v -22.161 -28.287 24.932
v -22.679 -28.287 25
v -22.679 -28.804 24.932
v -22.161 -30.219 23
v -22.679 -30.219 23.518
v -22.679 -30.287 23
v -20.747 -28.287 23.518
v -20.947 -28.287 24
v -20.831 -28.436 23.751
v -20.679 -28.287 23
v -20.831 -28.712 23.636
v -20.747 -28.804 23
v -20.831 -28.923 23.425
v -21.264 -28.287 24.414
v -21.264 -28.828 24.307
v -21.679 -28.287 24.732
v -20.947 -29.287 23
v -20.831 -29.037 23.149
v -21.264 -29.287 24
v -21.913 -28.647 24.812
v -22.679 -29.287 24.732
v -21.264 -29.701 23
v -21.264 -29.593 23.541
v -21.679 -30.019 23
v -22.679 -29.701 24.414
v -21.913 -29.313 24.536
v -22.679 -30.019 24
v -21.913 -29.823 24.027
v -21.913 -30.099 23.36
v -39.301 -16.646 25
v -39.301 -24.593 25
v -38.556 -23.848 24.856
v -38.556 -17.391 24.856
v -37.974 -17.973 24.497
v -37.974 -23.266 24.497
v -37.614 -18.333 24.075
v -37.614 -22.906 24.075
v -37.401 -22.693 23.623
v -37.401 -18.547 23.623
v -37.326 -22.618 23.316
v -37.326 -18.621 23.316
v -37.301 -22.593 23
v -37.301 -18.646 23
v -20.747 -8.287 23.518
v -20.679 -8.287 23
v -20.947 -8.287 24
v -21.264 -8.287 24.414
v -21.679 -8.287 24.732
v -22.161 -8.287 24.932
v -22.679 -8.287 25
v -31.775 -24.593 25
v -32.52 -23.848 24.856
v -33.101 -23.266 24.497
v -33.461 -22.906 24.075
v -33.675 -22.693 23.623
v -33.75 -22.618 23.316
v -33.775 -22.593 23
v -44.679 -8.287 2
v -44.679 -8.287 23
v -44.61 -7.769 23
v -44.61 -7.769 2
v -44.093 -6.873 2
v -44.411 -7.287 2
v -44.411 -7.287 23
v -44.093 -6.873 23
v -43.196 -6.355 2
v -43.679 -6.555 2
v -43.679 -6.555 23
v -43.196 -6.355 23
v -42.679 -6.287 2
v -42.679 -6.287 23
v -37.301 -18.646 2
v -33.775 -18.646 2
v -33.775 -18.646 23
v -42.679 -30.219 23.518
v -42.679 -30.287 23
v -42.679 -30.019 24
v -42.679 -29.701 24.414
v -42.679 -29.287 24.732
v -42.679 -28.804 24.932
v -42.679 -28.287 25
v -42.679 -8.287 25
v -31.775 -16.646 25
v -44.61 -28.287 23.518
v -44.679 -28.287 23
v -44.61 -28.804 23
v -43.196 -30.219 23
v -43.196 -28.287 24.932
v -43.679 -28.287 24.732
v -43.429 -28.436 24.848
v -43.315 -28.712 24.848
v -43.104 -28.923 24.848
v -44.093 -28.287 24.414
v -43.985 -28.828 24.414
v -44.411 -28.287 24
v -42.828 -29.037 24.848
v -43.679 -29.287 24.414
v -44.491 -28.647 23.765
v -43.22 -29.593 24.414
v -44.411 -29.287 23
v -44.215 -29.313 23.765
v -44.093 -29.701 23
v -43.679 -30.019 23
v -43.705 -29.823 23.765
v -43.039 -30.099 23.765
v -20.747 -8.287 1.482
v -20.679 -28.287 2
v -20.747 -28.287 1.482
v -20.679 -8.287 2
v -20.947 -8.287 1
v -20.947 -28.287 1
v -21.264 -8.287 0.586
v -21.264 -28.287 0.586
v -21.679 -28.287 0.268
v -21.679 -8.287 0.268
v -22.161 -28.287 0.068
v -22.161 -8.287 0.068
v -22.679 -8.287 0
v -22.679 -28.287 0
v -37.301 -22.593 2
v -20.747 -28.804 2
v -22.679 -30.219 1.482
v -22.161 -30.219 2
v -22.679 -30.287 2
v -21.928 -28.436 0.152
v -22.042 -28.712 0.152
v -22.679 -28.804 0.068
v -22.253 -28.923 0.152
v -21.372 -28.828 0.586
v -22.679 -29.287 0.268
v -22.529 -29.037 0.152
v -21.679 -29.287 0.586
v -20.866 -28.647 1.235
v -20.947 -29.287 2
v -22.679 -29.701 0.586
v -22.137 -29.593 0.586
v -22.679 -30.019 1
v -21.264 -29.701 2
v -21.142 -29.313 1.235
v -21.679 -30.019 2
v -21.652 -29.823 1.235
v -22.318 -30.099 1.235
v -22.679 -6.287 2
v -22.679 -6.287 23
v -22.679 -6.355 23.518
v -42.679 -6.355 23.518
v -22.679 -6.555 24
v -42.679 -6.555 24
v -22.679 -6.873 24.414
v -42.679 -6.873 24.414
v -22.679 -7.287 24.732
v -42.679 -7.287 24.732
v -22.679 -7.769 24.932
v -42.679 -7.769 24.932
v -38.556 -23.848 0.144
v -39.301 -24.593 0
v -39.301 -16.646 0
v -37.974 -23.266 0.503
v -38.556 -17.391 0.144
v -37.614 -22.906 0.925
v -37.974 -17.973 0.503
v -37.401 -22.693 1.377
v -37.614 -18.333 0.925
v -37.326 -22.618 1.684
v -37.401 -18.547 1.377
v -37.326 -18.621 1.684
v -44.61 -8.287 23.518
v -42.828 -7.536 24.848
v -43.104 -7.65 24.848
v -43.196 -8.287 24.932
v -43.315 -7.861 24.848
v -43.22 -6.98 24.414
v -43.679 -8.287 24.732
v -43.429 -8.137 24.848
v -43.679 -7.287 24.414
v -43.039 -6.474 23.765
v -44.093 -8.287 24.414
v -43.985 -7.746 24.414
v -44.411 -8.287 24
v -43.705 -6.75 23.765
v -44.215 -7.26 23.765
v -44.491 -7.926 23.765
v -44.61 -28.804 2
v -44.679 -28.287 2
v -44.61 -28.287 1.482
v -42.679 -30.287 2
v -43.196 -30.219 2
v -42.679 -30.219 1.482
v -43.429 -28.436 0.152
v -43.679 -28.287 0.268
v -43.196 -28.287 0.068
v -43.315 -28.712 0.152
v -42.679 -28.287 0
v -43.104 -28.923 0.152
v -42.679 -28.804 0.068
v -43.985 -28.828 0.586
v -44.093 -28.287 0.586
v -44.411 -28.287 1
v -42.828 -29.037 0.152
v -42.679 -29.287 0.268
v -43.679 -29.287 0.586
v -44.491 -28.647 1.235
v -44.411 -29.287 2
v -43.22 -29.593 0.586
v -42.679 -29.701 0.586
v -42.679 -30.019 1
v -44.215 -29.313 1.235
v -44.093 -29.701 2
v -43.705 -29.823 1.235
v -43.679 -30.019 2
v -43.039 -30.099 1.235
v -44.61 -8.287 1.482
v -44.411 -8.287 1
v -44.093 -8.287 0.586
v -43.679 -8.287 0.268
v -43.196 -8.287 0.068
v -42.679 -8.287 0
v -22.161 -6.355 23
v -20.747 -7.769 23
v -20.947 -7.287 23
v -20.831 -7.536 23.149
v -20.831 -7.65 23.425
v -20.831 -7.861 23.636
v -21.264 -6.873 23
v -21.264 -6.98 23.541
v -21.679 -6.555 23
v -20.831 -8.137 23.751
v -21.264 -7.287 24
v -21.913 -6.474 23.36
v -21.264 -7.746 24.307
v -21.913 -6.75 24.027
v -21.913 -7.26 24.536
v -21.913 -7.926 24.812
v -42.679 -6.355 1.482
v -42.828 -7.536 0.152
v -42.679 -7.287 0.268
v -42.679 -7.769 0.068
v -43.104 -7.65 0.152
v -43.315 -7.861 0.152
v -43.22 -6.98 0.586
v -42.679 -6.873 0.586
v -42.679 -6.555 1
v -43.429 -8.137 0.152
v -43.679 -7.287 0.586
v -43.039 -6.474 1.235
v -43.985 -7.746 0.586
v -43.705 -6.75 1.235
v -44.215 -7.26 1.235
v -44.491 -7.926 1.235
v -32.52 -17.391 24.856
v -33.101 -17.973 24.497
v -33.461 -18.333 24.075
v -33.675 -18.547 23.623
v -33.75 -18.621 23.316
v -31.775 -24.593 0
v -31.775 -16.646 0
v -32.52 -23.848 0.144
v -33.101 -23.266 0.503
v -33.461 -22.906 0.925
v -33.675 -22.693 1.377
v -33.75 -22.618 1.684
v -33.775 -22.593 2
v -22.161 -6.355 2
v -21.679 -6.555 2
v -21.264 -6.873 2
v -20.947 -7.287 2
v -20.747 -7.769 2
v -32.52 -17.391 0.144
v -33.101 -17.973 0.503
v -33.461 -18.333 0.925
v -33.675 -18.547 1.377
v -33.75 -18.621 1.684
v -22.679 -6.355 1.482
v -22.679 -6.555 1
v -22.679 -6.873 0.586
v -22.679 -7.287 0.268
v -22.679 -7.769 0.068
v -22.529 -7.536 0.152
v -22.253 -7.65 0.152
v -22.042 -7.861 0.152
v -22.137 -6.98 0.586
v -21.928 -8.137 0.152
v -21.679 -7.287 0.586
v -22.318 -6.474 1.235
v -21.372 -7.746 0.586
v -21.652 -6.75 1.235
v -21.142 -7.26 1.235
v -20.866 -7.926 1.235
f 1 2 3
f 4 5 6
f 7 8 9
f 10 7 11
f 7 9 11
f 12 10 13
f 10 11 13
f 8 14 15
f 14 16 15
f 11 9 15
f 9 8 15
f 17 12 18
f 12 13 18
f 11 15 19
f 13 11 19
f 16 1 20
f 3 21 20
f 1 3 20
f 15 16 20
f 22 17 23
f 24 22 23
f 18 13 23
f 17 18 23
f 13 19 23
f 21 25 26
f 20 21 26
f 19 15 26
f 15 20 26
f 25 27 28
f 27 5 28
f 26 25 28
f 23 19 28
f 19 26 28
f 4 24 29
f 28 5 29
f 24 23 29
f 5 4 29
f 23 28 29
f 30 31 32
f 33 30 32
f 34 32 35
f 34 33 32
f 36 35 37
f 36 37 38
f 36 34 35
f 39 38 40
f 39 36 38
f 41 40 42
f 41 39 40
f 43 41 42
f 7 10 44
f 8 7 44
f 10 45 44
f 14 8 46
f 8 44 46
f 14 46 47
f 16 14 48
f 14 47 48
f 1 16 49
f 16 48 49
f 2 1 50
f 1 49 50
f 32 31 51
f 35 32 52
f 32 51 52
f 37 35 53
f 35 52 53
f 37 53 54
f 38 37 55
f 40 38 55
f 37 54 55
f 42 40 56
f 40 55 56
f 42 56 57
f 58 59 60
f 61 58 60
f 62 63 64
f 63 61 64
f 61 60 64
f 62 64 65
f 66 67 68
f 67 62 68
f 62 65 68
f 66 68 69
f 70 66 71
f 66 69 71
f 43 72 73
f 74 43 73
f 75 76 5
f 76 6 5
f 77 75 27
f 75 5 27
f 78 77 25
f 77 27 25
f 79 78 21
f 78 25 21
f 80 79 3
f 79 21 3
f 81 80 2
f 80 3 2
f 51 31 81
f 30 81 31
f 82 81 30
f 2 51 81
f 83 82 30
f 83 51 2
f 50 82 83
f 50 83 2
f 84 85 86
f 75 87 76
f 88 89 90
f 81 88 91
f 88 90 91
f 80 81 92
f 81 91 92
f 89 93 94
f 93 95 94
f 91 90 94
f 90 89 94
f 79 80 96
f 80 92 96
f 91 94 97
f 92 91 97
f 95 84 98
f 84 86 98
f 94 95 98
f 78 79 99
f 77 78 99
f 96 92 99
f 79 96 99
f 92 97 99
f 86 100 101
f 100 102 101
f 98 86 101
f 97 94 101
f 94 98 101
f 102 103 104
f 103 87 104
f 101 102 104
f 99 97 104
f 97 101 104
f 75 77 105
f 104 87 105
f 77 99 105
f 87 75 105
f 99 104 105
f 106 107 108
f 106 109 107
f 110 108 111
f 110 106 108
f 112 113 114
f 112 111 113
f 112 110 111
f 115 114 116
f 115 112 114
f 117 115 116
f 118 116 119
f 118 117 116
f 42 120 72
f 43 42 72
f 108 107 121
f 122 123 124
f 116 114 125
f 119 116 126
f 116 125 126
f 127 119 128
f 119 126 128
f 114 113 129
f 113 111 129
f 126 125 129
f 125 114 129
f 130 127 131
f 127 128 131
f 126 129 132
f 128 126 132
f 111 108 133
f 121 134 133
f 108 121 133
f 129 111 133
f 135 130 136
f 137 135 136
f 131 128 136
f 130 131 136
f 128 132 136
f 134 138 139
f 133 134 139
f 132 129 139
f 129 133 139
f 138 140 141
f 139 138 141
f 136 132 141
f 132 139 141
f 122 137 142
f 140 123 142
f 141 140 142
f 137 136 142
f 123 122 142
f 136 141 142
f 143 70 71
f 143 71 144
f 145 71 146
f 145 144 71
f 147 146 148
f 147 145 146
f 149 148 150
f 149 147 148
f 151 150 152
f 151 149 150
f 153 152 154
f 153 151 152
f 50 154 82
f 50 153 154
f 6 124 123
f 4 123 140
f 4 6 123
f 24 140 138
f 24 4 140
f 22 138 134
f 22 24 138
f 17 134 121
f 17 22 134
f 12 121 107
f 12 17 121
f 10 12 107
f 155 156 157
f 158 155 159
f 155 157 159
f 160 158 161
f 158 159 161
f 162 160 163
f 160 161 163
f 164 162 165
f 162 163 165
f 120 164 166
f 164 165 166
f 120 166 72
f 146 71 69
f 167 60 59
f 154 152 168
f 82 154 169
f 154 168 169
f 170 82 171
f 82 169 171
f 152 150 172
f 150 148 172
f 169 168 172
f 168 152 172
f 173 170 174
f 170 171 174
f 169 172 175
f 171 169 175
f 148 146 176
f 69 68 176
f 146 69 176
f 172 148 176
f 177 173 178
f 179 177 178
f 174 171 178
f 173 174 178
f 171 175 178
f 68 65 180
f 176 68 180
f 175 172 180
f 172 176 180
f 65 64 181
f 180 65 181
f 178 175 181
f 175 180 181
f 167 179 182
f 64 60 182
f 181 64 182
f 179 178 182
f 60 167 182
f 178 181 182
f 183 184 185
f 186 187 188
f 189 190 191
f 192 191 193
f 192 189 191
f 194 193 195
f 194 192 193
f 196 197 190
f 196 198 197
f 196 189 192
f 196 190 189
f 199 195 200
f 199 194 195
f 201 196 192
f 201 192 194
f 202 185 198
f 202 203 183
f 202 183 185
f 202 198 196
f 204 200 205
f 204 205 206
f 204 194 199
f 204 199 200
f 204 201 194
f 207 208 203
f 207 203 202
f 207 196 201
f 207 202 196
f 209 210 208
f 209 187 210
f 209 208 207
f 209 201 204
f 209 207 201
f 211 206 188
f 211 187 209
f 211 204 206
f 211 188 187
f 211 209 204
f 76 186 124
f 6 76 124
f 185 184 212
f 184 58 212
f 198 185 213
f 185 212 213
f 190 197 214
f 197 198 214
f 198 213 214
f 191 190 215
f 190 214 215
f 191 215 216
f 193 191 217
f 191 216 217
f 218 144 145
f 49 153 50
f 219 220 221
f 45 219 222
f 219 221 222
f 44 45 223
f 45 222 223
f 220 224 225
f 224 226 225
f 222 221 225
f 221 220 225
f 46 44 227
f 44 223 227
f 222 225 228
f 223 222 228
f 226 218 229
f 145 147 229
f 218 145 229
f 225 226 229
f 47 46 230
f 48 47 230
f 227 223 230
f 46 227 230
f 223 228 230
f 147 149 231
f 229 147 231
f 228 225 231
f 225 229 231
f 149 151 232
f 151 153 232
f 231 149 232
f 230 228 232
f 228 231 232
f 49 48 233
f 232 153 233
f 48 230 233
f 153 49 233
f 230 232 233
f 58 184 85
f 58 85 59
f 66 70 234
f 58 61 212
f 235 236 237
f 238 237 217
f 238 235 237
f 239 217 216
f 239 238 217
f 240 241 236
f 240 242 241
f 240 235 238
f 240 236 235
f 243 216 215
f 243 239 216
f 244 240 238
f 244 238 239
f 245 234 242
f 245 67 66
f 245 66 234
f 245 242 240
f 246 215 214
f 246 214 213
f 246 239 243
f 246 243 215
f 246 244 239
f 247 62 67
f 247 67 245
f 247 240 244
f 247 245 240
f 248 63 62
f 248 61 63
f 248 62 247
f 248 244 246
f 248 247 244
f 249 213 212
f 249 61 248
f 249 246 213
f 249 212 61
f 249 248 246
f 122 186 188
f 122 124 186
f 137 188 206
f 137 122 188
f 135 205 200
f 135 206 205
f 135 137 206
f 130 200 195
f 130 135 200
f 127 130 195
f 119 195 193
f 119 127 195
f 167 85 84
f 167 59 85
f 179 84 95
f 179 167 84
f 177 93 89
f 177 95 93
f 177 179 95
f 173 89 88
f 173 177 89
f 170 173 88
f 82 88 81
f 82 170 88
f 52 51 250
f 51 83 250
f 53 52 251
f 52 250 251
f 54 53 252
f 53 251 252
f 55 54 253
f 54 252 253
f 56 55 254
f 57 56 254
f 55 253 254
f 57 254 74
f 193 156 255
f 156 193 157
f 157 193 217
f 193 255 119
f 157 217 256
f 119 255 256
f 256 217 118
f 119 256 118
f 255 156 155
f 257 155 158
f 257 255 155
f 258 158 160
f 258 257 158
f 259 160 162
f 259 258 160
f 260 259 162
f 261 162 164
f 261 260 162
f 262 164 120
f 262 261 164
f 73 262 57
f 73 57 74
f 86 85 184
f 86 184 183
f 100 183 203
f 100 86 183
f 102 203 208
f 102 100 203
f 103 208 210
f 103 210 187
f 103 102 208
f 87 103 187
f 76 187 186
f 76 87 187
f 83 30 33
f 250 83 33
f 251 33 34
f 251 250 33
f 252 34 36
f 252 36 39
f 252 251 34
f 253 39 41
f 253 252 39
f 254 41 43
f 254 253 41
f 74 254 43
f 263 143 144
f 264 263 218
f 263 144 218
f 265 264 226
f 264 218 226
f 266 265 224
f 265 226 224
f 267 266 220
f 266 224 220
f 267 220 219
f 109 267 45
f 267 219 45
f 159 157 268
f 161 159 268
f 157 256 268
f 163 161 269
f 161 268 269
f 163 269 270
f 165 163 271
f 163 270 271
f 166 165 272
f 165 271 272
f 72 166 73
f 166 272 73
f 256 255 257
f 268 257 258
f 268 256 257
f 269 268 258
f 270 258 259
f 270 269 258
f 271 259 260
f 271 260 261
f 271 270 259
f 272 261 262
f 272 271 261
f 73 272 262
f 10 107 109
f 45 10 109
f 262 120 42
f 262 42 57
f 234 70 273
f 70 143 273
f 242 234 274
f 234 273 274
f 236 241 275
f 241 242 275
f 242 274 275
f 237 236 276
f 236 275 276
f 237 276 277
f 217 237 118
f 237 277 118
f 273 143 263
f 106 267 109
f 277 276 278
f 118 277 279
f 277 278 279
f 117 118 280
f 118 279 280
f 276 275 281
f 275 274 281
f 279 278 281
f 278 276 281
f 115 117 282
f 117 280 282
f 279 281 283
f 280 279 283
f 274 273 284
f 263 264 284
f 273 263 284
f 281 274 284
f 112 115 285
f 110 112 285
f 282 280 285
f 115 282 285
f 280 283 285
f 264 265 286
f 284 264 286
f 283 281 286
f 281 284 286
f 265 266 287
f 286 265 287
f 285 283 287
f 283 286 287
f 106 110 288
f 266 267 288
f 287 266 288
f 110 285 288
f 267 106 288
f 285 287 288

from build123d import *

# Parameters (mm, degrees)
F0_W     = 24
F0_H     = 24
F0_W_2   = 3.526274
F0_H_2   = 3.947003
F1_DEPTH = 25
F2_R     = 2
F3_R     = 2


with BuildPart() as f1:
    # F0 (on Top) → F1 (new body)
    with BuildSketch(Plane.XY):
        with Locations((-32.678599, -18.286714)):
            Rectangle(F0_W, F0_H)
        with Locations((-35.5378, -20.619581)):
            Rectangle(F0_W_2, F0_H_2, mode=Mode.SUBTRACT)
    extrude(amount=F1_DEPTH)

    # F2
    f2_edges = [f1.edges().sort_by_distance(p)[0] for p in [
        (-44.678599, -6.286714, 12.5),
        (-32.678599, -6.286714, 25),
        (-20.678599, -6.286714, 12.5),
        (-32.678599, -6.286714, 0),
        (-44.678599, -30.286714, 12.5),
        (-44.678599, -18.286714, 0),
        (-44.678599, -18.286714, 25),
        (-32.678599, -30.286714, 25),
        (-20.678599, -18.286714, 25),
        (-20.678599, -30.286714, 12.5),
        (-20.678599, -18.286714, 0),
        (-32.678599, -30.286714, 0),
    ]]
    fillet(f2_edges, radius=F2_R)

    # F3
    f3_edges = [f1.edges().sort_by_distance(p)[0] for p in [
        (-33.774663, -20.619581, 25),
        (-35.5378, -22.593083, 0),
        (-35.5378, -18.64608, 25),
        (-37.300937, -20.619581, 25),
        (-35.5378, -22.593083, 25),
        (-37.300937, -20.619581, 0),
        (-35.5378, -18.64608, 0),
        (-33.774663, -20.619581, 0),
    ]]
    fillet(f3_edges, radius=F3_R)


solid = f1.part
